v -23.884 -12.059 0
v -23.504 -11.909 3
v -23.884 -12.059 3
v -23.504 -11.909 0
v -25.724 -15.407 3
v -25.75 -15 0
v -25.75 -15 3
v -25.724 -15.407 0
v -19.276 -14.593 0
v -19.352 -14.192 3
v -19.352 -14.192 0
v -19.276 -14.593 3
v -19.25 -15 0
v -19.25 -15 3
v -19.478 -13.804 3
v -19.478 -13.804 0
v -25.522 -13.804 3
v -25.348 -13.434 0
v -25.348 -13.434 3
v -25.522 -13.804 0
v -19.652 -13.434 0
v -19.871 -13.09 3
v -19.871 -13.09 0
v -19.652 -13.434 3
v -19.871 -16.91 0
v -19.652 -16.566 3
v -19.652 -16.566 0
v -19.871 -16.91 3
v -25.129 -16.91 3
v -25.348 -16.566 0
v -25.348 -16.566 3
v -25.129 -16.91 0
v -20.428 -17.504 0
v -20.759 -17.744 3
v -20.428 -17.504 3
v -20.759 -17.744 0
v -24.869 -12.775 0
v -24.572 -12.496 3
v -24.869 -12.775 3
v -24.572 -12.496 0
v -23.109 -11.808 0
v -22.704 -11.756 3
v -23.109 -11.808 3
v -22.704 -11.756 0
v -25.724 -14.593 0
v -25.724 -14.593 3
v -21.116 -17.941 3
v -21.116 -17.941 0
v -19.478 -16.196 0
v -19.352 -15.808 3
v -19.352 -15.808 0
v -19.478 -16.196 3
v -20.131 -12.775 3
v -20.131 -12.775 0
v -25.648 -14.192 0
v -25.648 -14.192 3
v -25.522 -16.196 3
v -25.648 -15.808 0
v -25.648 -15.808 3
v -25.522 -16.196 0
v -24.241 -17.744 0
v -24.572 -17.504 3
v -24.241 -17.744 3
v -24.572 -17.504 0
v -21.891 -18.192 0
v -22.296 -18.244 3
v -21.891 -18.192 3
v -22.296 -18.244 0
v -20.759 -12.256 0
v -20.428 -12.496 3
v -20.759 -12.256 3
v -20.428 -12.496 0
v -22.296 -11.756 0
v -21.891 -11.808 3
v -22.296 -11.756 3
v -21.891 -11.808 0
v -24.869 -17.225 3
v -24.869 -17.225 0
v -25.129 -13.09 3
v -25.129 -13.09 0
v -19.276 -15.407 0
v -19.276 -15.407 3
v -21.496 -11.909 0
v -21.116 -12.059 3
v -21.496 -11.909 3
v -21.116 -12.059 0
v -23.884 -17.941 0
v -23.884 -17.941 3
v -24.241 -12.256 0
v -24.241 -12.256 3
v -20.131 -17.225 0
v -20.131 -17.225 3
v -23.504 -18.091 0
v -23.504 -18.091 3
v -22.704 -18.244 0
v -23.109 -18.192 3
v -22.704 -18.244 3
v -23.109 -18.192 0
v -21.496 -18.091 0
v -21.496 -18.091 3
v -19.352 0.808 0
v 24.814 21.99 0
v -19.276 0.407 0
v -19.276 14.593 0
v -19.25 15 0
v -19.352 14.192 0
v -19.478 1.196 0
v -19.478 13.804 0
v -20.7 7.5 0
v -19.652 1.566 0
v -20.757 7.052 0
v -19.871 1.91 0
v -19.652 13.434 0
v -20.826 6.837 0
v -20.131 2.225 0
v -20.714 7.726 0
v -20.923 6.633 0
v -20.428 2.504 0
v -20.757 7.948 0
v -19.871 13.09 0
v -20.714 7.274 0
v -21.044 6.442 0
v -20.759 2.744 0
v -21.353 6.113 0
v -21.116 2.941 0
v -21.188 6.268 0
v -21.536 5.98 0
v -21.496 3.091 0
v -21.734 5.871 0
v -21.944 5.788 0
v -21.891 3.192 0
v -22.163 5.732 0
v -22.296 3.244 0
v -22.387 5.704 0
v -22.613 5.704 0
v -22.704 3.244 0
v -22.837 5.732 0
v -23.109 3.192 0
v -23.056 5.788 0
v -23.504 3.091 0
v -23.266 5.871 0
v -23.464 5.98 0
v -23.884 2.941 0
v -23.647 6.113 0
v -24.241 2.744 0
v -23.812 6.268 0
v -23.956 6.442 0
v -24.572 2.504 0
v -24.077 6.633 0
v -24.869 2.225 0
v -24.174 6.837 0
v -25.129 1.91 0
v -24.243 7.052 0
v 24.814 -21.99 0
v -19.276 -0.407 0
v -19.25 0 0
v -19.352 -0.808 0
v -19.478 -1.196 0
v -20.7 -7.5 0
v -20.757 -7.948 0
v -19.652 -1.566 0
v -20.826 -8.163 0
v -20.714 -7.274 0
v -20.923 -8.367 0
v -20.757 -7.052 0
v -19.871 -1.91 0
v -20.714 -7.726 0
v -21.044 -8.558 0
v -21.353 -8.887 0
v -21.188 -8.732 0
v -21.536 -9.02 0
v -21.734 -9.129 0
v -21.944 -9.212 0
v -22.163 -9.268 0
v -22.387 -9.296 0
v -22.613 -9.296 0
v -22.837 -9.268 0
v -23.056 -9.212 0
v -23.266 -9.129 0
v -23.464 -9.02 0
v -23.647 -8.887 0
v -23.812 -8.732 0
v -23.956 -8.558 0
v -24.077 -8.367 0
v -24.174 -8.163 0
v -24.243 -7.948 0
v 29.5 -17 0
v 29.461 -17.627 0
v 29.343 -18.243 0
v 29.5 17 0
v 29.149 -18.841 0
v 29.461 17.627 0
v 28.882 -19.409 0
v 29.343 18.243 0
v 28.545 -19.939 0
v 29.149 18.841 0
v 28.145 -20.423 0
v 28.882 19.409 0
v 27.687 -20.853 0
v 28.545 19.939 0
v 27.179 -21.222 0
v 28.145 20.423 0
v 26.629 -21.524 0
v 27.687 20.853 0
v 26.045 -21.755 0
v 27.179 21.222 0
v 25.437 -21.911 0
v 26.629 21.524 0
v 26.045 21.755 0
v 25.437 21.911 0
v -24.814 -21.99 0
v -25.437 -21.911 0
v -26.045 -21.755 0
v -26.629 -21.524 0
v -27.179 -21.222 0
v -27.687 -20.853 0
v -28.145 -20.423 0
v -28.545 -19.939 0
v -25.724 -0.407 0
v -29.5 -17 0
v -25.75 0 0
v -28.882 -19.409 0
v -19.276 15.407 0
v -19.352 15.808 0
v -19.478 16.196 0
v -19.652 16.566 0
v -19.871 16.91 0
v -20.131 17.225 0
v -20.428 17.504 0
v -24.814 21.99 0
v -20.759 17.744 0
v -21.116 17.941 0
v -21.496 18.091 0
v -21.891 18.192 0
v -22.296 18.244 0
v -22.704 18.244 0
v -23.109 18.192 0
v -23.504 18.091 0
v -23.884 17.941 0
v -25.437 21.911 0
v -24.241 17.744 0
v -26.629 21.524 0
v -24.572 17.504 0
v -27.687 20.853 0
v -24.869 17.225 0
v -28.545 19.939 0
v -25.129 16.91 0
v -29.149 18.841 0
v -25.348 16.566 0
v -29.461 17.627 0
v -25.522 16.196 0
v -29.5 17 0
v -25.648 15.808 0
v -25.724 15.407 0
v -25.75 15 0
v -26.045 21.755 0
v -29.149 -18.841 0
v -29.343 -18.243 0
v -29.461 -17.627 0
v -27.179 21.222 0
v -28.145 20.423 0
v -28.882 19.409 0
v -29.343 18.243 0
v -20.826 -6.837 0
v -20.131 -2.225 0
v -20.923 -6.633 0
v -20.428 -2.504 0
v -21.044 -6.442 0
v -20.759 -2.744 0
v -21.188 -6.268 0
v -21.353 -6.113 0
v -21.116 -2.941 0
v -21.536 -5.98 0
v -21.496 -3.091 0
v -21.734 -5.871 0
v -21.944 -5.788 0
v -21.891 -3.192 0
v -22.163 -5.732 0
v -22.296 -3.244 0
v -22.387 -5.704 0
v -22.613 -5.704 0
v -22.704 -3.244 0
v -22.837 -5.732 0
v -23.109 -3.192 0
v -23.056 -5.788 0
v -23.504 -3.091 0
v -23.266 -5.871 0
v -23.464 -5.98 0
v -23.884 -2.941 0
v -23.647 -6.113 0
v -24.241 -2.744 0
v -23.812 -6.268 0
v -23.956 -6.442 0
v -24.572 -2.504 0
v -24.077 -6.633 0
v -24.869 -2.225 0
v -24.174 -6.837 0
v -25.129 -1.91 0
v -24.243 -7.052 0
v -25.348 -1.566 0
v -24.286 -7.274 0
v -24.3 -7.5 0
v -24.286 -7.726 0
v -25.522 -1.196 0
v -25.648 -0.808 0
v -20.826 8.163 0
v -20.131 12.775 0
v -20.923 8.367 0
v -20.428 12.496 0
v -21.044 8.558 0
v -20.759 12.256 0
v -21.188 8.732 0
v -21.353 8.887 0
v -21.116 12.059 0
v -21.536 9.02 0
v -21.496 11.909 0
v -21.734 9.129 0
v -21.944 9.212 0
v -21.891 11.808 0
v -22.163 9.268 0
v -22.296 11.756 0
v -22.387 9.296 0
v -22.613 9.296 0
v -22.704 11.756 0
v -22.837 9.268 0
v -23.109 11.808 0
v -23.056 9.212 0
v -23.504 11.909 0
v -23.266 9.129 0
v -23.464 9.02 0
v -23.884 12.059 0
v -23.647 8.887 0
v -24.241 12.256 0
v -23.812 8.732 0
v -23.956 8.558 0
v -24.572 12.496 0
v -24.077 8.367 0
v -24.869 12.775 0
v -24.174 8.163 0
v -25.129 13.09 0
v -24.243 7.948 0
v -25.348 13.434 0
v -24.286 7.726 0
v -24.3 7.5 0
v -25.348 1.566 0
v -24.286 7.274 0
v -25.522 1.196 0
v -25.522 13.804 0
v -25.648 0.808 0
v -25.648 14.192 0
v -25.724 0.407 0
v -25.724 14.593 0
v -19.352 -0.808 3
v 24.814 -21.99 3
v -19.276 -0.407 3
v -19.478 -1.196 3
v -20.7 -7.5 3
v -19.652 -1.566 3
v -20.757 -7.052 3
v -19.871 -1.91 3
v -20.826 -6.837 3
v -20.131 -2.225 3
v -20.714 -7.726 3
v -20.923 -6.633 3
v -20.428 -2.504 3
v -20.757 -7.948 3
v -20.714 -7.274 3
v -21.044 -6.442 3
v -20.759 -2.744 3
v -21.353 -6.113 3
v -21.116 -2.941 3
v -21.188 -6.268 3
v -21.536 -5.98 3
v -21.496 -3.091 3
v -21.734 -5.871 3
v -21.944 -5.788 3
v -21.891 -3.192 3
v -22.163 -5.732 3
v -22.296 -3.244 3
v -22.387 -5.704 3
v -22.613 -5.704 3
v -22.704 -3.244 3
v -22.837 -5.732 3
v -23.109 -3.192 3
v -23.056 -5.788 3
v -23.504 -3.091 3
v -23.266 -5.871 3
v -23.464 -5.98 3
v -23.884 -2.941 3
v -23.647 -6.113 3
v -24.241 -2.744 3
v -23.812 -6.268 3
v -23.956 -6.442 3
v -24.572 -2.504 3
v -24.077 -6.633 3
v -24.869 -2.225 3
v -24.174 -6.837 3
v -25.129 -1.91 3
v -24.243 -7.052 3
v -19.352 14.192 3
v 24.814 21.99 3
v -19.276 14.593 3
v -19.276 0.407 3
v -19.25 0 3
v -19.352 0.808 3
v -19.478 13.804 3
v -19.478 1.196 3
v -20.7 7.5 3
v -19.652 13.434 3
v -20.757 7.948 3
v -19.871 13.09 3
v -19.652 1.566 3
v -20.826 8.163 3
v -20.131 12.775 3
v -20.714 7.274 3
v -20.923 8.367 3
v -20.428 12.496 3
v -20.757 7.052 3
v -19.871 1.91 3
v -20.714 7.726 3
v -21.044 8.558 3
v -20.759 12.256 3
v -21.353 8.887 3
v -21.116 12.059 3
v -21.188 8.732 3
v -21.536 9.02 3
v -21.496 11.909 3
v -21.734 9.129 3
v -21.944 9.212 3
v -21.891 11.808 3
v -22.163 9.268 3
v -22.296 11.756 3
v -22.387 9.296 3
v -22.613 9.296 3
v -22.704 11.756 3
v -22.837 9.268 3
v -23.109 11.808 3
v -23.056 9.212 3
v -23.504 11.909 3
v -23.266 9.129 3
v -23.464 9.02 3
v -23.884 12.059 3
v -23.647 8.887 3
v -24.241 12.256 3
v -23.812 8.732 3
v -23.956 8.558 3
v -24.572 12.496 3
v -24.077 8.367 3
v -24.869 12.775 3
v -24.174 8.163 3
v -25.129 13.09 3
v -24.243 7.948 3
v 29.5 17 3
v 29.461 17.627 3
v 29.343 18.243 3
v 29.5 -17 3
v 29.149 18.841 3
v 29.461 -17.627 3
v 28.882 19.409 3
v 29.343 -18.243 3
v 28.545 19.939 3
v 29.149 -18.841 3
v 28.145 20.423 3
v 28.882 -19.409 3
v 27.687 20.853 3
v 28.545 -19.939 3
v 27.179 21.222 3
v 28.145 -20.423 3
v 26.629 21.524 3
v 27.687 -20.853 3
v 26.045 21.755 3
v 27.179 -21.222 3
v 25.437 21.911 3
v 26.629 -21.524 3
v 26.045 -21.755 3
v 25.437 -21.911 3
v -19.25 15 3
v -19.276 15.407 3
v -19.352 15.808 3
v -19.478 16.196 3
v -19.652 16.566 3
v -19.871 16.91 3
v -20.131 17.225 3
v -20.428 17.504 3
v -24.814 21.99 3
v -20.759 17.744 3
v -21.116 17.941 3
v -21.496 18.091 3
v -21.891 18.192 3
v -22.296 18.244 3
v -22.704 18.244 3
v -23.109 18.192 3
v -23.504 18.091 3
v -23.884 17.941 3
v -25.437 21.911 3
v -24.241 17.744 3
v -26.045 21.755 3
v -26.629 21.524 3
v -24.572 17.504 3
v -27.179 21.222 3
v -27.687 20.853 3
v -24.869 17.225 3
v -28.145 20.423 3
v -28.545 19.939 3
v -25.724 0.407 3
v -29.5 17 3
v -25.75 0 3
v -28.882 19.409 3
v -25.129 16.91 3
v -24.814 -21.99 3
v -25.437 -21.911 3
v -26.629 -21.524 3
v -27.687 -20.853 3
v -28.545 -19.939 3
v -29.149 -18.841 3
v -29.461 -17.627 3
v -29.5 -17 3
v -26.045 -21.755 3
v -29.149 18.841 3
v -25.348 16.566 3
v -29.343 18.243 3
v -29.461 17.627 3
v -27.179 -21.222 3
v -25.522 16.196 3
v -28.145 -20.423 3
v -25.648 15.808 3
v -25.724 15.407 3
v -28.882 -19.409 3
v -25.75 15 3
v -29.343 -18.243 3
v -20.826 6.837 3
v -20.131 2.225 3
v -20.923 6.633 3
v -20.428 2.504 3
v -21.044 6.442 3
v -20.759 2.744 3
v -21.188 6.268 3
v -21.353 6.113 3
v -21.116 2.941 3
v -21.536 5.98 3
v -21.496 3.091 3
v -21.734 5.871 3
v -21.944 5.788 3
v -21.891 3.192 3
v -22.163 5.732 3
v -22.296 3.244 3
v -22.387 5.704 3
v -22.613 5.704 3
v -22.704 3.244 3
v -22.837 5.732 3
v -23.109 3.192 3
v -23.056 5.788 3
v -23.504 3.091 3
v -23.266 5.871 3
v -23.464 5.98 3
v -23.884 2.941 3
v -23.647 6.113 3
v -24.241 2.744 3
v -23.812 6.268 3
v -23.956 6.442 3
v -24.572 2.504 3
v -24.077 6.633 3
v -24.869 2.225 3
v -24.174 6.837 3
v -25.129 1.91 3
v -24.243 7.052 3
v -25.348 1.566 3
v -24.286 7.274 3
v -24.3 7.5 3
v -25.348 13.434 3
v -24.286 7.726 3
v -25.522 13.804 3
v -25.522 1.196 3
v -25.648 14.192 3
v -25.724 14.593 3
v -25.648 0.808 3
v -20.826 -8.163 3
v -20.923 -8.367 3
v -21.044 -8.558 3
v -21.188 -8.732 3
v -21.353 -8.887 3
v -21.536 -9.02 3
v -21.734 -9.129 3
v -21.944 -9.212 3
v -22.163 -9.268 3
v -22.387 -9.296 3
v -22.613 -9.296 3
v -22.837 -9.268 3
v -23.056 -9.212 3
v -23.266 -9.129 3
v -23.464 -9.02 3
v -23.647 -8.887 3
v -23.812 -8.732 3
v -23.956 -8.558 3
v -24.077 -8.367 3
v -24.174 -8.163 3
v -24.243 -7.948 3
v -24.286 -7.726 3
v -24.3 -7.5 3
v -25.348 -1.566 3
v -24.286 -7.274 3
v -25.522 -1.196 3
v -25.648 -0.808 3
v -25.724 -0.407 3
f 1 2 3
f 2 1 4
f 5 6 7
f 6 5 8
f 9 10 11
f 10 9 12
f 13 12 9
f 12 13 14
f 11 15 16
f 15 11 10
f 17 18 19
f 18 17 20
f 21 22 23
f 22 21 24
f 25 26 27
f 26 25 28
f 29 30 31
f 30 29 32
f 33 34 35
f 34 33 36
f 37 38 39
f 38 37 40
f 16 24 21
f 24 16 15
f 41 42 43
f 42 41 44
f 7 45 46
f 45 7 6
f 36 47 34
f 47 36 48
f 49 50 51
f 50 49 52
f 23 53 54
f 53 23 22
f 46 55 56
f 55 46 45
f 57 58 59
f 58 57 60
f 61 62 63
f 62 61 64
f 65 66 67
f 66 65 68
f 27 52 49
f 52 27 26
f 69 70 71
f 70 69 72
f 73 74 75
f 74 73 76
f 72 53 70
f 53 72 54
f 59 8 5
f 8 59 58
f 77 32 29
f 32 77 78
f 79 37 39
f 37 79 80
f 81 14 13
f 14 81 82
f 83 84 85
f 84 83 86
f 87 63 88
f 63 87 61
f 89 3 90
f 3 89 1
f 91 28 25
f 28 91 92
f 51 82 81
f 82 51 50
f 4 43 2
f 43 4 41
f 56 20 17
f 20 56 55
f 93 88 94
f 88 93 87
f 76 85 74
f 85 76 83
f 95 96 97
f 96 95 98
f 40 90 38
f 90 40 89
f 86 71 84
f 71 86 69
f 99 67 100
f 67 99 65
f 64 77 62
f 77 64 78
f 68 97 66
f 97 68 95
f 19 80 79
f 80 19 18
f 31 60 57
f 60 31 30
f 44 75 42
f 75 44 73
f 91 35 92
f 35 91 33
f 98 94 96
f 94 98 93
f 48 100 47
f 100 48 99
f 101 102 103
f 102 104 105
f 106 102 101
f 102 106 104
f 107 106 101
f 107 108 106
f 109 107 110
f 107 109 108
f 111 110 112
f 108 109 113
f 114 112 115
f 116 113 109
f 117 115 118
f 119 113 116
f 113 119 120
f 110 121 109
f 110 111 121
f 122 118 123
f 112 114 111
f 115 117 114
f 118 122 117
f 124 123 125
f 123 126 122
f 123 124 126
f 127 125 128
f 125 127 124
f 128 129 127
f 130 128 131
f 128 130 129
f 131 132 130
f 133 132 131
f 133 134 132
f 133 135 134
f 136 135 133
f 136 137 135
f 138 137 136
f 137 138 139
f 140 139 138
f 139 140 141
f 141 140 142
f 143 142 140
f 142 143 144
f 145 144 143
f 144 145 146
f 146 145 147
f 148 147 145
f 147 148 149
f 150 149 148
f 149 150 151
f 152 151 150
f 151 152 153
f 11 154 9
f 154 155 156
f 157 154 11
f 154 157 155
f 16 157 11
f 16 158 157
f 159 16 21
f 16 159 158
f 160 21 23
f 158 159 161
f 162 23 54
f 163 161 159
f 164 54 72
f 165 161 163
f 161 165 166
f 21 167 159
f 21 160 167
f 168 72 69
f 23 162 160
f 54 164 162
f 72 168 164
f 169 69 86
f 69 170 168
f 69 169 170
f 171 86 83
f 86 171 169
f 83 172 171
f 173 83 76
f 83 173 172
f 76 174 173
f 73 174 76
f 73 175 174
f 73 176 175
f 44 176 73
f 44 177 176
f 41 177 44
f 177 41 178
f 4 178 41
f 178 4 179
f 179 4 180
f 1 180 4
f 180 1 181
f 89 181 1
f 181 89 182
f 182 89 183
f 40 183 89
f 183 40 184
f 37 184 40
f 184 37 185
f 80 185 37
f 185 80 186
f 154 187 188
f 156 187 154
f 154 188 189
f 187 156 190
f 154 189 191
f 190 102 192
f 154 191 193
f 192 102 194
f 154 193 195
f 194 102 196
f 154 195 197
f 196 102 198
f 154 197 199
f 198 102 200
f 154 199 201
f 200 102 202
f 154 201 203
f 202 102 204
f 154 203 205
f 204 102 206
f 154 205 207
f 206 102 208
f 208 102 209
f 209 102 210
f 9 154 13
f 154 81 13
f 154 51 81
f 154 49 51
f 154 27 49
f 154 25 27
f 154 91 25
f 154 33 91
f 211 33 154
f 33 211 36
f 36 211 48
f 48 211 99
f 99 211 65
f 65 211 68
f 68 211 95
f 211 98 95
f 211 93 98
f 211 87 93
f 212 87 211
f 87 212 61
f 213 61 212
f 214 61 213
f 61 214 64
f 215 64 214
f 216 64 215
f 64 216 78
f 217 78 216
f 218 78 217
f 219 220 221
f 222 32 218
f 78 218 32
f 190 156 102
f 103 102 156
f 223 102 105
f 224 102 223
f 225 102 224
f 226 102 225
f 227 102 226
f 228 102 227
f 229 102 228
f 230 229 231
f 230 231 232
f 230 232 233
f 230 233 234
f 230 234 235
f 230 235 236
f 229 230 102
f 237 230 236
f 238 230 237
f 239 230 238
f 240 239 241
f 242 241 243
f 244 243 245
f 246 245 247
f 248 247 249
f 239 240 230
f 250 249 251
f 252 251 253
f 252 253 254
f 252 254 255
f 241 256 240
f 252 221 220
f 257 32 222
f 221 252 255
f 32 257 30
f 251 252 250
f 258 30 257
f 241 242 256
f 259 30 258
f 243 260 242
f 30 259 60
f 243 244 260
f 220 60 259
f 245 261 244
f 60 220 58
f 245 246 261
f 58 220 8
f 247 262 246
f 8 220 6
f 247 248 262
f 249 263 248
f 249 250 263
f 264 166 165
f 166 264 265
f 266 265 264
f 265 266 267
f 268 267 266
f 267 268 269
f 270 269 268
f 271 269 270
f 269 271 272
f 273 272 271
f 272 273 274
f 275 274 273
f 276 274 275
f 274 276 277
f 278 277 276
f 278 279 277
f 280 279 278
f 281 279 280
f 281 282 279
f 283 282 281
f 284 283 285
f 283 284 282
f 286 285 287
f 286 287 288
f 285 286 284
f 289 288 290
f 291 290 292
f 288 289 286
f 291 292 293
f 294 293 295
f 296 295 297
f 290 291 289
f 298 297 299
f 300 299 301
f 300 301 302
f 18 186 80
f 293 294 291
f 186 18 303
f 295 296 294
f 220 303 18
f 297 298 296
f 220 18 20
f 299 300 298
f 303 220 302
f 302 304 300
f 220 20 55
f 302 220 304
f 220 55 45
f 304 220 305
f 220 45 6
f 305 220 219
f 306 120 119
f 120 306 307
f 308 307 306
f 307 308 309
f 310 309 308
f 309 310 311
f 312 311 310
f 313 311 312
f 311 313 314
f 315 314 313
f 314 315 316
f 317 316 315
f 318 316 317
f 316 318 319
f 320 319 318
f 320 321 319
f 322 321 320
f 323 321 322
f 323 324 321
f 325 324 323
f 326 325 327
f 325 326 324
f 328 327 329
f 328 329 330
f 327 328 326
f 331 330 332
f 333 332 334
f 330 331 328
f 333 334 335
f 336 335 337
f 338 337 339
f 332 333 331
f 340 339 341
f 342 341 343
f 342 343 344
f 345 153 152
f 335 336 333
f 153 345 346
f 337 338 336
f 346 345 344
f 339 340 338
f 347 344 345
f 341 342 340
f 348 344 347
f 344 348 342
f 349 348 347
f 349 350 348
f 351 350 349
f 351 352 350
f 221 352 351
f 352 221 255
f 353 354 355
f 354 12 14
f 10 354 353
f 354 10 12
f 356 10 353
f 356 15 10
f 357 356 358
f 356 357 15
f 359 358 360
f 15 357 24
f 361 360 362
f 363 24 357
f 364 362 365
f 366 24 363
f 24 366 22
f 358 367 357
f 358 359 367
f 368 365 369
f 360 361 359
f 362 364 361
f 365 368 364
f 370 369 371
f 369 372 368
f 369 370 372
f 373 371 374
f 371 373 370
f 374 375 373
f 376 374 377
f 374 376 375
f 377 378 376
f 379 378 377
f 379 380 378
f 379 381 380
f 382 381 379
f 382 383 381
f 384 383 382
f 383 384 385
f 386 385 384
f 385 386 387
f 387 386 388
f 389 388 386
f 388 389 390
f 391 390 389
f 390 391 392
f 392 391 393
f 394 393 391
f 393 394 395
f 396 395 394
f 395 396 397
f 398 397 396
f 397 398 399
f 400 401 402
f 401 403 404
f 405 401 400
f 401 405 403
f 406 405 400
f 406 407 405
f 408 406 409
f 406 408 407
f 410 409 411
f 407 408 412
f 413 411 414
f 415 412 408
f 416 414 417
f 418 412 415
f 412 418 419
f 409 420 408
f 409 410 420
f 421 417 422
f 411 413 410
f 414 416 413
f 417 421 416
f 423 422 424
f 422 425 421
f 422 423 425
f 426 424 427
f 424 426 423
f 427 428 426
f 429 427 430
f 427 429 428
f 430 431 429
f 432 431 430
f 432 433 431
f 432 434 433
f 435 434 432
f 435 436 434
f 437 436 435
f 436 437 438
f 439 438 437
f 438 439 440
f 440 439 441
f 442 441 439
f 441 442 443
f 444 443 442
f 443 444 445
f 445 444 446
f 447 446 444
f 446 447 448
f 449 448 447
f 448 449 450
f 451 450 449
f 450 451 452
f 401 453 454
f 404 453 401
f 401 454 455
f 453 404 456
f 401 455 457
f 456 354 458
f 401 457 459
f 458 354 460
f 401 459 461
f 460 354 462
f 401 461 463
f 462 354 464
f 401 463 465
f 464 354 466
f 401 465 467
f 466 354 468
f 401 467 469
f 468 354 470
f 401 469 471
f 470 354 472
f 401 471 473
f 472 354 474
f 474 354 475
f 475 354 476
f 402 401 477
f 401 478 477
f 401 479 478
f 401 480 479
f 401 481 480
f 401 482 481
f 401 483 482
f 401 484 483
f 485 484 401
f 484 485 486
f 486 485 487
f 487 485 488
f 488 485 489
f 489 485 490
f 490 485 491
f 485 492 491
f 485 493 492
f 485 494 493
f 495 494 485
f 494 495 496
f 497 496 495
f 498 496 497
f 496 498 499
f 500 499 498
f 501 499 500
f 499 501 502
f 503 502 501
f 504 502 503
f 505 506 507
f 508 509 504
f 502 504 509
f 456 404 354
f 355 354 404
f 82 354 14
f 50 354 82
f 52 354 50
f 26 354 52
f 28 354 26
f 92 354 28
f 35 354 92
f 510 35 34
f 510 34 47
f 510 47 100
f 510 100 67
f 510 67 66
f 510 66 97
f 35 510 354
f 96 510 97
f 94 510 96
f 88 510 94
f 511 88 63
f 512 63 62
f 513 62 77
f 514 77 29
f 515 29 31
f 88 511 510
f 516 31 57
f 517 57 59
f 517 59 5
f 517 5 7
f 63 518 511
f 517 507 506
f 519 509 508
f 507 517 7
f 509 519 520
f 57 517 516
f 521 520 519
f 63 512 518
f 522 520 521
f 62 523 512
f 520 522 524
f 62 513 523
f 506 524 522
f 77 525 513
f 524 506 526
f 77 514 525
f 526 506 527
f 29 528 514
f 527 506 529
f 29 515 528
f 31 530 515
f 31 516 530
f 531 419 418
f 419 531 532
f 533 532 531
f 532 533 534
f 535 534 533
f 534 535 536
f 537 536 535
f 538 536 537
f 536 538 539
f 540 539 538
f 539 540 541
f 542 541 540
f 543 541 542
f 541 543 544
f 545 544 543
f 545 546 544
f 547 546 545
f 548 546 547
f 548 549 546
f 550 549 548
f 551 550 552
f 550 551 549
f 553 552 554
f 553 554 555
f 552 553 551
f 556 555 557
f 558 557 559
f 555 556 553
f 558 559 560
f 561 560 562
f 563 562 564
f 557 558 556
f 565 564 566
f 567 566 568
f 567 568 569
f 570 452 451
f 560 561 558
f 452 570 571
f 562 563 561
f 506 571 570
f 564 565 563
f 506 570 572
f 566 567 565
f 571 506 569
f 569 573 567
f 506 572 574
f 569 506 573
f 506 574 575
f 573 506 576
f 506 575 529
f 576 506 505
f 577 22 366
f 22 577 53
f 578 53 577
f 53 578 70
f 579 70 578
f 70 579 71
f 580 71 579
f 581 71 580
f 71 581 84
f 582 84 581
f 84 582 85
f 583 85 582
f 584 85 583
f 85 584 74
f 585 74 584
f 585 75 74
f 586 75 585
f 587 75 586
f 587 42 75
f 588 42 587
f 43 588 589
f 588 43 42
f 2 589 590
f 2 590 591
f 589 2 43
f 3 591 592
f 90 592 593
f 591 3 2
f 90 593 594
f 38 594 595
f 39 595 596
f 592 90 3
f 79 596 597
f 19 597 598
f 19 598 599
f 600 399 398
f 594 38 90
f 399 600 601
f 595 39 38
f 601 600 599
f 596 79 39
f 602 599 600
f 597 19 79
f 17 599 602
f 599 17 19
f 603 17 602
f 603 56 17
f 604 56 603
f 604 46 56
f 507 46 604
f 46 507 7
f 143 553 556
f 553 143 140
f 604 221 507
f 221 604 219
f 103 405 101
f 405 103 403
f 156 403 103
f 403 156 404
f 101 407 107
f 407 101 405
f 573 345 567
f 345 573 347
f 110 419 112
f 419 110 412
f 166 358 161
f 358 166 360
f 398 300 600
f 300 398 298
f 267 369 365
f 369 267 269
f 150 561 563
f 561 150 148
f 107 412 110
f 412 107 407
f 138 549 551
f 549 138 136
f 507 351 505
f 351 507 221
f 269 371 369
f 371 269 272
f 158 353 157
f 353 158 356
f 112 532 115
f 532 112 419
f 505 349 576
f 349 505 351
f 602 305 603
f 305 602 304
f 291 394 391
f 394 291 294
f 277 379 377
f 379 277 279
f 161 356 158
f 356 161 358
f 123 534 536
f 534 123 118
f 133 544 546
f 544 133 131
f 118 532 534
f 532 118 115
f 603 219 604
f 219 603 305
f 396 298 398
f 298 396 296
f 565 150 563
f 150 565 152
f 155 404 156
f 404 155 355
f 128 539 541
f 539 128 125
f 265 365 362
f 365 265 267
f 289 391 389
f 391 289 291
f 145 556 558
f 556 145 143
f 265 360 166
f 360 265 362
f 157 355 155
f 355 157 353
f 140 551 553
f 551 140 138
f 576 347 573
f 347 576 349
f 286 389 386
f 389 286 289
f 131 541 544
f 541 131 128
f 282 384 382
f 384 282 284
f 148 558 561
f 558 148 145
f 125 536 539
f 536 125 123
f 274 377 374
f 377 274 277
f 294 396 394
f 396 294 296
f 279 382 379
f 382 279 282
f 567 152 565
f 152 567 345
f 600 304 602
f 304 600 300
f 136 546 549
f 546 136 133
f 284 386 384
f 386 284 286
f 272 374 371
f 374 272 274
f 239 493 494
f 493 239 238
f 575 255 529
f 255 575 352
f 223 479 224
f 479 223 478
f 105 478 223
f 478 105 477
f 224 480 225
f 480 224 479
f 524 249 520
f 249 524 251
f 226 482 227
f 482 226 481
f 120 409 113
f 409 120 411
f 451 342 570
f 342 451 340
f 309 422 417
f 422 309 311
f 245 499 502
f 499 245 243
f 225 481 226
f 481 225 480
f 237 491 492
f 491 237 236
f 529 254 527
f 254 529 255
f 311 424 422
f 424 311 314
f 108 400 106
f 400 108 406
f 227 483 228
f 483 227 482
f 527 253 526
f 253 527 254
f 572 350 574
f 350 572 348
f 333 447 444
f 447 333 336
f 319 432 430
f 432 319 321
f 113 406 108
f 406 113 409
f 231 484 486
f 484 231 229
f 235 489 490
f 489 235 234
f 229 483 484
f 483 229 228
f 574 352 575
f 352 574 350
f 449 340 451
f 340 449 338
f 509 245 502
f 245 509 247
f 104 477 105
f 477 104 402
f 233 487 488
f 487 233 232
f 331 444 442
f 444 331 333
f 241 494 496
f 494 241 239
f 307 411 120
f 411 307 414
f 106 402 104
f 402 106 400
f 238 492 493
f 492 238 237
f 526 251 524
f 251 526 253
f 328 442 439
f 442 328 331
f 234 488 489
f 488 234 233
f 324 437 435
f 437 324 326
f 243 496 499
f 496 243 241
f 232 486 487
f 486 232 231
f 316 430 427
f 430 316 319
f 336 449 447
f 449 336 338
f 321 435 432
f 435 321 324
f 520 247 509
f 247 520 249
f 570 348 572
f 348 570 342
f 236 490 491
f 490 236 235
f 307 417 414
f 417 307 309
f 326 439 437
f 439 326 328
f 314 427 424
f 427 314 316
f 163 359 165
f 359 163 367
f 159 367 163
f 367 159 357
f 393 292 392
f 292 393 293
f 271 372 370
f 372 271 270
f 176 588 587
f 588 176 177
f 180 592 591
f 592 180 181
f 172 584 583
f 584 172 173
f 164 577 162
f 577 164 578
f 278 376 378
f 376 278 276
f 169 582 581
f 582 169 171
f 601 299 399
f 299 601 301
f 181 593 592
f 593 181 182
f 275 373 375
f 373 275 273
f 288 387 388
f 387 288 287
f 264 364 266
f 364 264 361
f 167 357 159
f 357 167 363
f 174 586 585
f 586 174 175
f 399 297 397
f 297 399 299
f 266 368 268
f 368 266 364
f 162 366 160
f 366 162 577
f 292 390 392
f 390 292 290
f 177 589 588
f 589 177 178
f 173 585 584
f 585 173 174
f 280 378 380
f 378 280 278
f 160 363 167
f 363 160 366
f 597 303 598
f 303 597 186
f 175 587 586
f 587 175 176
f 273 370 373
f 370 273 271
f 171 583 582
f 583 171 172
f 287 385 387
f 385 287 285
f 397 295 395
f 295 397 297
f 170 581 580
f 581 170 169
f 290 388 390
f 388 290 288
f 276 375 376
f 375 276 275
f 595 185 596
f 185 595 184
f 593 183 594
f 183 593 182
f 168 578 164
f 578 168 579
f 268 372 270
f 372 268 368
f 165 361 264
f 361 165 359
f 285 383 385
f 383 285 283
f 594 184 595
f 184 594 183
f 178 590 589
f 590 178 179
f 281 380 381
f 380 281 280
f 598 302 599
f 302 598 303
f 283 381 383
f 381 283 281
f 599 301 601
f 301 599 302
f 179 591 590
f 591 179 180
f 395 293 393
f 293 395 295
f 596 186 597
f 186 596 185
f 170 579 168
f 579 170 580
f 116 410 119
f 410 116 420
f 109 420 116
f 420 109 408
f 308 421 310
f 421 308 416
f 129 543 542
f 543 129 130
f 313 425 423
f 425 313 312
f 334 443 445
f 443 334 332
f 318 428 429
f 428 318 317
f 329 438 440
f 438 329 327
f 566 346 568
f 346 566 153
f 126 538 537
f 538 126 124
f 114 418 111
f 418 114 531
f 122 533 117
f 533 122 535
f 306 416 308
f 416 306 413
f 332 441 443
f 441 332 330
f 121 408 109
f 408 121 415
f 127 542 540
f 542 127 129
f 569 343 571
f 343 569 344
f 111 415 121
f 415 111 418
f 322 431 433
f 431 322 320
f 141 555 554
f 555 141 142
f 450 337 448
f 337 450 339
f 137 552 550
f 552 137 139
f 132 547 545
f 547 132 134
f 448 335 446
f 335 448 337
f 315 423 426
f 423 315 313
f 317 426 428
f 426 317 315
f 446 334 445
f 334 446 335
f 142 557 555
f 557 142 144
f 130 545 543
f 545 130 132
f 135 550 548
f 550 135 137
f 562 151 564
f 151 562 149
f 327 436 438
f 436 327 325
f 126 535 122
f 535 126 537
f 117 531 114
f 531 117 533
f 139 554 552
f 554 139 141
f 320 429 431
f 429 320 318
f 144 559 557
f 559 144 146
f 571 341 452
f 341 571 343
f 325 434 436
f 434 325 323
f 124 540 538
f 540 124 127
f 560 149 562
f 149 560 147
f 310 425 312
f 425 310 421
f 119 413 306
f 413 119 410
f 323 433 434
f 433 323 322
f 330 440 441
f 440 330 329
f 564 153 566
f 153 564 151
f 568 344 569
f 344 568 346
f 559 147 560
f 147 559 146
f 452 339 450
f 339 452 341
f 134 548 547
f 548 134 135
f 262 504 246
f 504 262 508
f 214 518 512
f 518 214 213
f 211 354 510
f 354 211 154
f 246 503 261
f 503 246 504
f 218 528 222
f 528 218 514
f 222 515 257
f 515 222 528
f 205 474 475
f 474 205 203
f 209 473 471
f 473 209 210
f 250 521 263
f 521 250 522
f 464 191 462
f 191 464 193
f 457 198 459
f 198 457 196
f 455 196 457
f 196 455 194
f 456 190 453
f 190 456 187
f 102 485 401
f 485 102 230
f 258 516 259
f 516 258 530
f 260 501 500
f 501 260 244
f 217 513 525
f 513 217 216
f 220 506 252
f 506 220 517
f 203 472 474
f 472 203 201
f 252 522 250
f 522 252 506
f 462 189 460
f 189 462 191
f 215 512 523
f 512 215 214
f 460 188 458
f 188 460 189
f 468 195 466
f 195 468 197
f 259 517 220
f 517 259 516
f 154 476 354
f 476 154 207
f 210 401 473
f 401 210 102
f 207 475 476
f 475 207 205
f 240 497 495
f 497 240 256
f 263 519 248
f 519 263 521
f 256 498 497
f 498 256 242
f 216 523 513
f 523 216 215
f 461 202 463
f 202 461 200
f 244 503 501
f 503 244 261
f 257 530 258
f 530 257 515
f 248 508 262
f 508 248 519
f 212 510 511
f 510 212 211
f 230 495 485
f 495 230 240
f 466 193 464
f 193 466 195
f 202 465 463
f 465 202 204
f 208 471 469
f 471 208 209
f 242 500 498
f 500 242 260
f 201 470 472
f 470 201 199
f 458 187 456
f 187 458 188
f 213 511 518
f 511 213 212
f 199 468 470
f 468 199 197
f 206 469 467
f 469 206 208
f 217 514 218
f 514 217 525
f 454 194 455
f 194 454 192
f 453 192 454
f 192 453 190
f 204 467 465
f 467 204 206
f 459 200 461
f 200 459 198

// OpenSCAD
$fn = 50;


difference() {
	union() {
		hull() {
			translate(v = [-24.5000000000, 17.0000000000, 0]) {
				cylinder(h = 3, r = 5);
			}
			translate(v = [24.5000000000, 17.0000000000, 0]) {
				cylinder(h = 3, r = 5);
			}
			translate(v = [-24.5000000000, -17.0000000000, 0]) {
				cylinder(h = 3, r = 5);
			}
			translate(v = [24.5000000000, -17.0000000000, 0]) {
				cylinder(h = 3, r = 5);
			}
		}
	}
	union() {
		translate(v = [-22.5000000000, -15.0000000000, 0]) {
			cylinder(h = 3, r = 3.2500000000);
		}
		translate(v = [-22.5000000000, 0.0000000000, 0]) {
			cylinder(h = 3, r = 3.2500000000);
		}
		translate(v = [-22.5000000000, 15.0000000000, 0]) {
			cylinder(h = 3, r = 3.2500000000);
		}
		translate(v = [-22.5000000000, -15.0000000000, 0]) {
			cylinder(h = 3, r = 1.8000000000);
		}
		translate(v = [-22.5000000000, -7.5000000000, 0]) {
			cylinder(h = 3, r = 1.8000000000);
		}
		translate(v = [-22.5000000000, 0.0000000000, 0]) {
			cylinder(h = 3, r = 1.8000000000);
		}
		translate(v = [-22.5000000000, 7.5000000000, 0]) {
			cylinder(h = 3, r = 1.8000000000);
		}
		translate(v = [-22.5000000000, 15.0000000000, 0]) {
			cylinder(h = 3, r = 1.8000000000);
		}
		translate(v = [-22.5000000000, -15.0000000000, 0]) {
			cylinder(h = 3, r = 1.8000000000);
		}
		translate(v = [-22.5000000000, -7.5000000000, 0]) {
			cylinder(h = 3, r = 1.8000000000);
		}
		translate(v = [-22.5000000000, 0.0000000000, 0]) {
			cylinder(h = 3, r = 1.8000000000);
		}
		translate(v = [-22.5000000000, 7.5000000000, 0]) {
			cylinder(h = 3, r = 1.8000000000);
		}
		translate(v = [-22.5000000000, 15.0000000000, 0]) {
			cylinder(h = 3, r = 1.8000000000);
		}
		translate(v = [-22.5000000000, -15.0000000000, 0]) {
			cylinder(h = 3, r = 1.8000000000);
		}
		translate(v = [-22.5000000000, -7.5000000000, 0]) {
			cylinder(h = 3, r = 1.8000000000);
		}
		translate(v = [-22.5000000000, 0.0000000000, 0]) {
			cylinder(h = 3, r = 1.8000000000);
		}
		translate(v = [-22.5000000000, 7.5000000000, 0]) {
			cylinder(h = 3, r = 1.8000000000);
		}
		translate(v = [-22.5000000000, 15.0000000000, 0]) {
			cylinder(h = 3, r = 1.8000000000);
		}
	}
}
